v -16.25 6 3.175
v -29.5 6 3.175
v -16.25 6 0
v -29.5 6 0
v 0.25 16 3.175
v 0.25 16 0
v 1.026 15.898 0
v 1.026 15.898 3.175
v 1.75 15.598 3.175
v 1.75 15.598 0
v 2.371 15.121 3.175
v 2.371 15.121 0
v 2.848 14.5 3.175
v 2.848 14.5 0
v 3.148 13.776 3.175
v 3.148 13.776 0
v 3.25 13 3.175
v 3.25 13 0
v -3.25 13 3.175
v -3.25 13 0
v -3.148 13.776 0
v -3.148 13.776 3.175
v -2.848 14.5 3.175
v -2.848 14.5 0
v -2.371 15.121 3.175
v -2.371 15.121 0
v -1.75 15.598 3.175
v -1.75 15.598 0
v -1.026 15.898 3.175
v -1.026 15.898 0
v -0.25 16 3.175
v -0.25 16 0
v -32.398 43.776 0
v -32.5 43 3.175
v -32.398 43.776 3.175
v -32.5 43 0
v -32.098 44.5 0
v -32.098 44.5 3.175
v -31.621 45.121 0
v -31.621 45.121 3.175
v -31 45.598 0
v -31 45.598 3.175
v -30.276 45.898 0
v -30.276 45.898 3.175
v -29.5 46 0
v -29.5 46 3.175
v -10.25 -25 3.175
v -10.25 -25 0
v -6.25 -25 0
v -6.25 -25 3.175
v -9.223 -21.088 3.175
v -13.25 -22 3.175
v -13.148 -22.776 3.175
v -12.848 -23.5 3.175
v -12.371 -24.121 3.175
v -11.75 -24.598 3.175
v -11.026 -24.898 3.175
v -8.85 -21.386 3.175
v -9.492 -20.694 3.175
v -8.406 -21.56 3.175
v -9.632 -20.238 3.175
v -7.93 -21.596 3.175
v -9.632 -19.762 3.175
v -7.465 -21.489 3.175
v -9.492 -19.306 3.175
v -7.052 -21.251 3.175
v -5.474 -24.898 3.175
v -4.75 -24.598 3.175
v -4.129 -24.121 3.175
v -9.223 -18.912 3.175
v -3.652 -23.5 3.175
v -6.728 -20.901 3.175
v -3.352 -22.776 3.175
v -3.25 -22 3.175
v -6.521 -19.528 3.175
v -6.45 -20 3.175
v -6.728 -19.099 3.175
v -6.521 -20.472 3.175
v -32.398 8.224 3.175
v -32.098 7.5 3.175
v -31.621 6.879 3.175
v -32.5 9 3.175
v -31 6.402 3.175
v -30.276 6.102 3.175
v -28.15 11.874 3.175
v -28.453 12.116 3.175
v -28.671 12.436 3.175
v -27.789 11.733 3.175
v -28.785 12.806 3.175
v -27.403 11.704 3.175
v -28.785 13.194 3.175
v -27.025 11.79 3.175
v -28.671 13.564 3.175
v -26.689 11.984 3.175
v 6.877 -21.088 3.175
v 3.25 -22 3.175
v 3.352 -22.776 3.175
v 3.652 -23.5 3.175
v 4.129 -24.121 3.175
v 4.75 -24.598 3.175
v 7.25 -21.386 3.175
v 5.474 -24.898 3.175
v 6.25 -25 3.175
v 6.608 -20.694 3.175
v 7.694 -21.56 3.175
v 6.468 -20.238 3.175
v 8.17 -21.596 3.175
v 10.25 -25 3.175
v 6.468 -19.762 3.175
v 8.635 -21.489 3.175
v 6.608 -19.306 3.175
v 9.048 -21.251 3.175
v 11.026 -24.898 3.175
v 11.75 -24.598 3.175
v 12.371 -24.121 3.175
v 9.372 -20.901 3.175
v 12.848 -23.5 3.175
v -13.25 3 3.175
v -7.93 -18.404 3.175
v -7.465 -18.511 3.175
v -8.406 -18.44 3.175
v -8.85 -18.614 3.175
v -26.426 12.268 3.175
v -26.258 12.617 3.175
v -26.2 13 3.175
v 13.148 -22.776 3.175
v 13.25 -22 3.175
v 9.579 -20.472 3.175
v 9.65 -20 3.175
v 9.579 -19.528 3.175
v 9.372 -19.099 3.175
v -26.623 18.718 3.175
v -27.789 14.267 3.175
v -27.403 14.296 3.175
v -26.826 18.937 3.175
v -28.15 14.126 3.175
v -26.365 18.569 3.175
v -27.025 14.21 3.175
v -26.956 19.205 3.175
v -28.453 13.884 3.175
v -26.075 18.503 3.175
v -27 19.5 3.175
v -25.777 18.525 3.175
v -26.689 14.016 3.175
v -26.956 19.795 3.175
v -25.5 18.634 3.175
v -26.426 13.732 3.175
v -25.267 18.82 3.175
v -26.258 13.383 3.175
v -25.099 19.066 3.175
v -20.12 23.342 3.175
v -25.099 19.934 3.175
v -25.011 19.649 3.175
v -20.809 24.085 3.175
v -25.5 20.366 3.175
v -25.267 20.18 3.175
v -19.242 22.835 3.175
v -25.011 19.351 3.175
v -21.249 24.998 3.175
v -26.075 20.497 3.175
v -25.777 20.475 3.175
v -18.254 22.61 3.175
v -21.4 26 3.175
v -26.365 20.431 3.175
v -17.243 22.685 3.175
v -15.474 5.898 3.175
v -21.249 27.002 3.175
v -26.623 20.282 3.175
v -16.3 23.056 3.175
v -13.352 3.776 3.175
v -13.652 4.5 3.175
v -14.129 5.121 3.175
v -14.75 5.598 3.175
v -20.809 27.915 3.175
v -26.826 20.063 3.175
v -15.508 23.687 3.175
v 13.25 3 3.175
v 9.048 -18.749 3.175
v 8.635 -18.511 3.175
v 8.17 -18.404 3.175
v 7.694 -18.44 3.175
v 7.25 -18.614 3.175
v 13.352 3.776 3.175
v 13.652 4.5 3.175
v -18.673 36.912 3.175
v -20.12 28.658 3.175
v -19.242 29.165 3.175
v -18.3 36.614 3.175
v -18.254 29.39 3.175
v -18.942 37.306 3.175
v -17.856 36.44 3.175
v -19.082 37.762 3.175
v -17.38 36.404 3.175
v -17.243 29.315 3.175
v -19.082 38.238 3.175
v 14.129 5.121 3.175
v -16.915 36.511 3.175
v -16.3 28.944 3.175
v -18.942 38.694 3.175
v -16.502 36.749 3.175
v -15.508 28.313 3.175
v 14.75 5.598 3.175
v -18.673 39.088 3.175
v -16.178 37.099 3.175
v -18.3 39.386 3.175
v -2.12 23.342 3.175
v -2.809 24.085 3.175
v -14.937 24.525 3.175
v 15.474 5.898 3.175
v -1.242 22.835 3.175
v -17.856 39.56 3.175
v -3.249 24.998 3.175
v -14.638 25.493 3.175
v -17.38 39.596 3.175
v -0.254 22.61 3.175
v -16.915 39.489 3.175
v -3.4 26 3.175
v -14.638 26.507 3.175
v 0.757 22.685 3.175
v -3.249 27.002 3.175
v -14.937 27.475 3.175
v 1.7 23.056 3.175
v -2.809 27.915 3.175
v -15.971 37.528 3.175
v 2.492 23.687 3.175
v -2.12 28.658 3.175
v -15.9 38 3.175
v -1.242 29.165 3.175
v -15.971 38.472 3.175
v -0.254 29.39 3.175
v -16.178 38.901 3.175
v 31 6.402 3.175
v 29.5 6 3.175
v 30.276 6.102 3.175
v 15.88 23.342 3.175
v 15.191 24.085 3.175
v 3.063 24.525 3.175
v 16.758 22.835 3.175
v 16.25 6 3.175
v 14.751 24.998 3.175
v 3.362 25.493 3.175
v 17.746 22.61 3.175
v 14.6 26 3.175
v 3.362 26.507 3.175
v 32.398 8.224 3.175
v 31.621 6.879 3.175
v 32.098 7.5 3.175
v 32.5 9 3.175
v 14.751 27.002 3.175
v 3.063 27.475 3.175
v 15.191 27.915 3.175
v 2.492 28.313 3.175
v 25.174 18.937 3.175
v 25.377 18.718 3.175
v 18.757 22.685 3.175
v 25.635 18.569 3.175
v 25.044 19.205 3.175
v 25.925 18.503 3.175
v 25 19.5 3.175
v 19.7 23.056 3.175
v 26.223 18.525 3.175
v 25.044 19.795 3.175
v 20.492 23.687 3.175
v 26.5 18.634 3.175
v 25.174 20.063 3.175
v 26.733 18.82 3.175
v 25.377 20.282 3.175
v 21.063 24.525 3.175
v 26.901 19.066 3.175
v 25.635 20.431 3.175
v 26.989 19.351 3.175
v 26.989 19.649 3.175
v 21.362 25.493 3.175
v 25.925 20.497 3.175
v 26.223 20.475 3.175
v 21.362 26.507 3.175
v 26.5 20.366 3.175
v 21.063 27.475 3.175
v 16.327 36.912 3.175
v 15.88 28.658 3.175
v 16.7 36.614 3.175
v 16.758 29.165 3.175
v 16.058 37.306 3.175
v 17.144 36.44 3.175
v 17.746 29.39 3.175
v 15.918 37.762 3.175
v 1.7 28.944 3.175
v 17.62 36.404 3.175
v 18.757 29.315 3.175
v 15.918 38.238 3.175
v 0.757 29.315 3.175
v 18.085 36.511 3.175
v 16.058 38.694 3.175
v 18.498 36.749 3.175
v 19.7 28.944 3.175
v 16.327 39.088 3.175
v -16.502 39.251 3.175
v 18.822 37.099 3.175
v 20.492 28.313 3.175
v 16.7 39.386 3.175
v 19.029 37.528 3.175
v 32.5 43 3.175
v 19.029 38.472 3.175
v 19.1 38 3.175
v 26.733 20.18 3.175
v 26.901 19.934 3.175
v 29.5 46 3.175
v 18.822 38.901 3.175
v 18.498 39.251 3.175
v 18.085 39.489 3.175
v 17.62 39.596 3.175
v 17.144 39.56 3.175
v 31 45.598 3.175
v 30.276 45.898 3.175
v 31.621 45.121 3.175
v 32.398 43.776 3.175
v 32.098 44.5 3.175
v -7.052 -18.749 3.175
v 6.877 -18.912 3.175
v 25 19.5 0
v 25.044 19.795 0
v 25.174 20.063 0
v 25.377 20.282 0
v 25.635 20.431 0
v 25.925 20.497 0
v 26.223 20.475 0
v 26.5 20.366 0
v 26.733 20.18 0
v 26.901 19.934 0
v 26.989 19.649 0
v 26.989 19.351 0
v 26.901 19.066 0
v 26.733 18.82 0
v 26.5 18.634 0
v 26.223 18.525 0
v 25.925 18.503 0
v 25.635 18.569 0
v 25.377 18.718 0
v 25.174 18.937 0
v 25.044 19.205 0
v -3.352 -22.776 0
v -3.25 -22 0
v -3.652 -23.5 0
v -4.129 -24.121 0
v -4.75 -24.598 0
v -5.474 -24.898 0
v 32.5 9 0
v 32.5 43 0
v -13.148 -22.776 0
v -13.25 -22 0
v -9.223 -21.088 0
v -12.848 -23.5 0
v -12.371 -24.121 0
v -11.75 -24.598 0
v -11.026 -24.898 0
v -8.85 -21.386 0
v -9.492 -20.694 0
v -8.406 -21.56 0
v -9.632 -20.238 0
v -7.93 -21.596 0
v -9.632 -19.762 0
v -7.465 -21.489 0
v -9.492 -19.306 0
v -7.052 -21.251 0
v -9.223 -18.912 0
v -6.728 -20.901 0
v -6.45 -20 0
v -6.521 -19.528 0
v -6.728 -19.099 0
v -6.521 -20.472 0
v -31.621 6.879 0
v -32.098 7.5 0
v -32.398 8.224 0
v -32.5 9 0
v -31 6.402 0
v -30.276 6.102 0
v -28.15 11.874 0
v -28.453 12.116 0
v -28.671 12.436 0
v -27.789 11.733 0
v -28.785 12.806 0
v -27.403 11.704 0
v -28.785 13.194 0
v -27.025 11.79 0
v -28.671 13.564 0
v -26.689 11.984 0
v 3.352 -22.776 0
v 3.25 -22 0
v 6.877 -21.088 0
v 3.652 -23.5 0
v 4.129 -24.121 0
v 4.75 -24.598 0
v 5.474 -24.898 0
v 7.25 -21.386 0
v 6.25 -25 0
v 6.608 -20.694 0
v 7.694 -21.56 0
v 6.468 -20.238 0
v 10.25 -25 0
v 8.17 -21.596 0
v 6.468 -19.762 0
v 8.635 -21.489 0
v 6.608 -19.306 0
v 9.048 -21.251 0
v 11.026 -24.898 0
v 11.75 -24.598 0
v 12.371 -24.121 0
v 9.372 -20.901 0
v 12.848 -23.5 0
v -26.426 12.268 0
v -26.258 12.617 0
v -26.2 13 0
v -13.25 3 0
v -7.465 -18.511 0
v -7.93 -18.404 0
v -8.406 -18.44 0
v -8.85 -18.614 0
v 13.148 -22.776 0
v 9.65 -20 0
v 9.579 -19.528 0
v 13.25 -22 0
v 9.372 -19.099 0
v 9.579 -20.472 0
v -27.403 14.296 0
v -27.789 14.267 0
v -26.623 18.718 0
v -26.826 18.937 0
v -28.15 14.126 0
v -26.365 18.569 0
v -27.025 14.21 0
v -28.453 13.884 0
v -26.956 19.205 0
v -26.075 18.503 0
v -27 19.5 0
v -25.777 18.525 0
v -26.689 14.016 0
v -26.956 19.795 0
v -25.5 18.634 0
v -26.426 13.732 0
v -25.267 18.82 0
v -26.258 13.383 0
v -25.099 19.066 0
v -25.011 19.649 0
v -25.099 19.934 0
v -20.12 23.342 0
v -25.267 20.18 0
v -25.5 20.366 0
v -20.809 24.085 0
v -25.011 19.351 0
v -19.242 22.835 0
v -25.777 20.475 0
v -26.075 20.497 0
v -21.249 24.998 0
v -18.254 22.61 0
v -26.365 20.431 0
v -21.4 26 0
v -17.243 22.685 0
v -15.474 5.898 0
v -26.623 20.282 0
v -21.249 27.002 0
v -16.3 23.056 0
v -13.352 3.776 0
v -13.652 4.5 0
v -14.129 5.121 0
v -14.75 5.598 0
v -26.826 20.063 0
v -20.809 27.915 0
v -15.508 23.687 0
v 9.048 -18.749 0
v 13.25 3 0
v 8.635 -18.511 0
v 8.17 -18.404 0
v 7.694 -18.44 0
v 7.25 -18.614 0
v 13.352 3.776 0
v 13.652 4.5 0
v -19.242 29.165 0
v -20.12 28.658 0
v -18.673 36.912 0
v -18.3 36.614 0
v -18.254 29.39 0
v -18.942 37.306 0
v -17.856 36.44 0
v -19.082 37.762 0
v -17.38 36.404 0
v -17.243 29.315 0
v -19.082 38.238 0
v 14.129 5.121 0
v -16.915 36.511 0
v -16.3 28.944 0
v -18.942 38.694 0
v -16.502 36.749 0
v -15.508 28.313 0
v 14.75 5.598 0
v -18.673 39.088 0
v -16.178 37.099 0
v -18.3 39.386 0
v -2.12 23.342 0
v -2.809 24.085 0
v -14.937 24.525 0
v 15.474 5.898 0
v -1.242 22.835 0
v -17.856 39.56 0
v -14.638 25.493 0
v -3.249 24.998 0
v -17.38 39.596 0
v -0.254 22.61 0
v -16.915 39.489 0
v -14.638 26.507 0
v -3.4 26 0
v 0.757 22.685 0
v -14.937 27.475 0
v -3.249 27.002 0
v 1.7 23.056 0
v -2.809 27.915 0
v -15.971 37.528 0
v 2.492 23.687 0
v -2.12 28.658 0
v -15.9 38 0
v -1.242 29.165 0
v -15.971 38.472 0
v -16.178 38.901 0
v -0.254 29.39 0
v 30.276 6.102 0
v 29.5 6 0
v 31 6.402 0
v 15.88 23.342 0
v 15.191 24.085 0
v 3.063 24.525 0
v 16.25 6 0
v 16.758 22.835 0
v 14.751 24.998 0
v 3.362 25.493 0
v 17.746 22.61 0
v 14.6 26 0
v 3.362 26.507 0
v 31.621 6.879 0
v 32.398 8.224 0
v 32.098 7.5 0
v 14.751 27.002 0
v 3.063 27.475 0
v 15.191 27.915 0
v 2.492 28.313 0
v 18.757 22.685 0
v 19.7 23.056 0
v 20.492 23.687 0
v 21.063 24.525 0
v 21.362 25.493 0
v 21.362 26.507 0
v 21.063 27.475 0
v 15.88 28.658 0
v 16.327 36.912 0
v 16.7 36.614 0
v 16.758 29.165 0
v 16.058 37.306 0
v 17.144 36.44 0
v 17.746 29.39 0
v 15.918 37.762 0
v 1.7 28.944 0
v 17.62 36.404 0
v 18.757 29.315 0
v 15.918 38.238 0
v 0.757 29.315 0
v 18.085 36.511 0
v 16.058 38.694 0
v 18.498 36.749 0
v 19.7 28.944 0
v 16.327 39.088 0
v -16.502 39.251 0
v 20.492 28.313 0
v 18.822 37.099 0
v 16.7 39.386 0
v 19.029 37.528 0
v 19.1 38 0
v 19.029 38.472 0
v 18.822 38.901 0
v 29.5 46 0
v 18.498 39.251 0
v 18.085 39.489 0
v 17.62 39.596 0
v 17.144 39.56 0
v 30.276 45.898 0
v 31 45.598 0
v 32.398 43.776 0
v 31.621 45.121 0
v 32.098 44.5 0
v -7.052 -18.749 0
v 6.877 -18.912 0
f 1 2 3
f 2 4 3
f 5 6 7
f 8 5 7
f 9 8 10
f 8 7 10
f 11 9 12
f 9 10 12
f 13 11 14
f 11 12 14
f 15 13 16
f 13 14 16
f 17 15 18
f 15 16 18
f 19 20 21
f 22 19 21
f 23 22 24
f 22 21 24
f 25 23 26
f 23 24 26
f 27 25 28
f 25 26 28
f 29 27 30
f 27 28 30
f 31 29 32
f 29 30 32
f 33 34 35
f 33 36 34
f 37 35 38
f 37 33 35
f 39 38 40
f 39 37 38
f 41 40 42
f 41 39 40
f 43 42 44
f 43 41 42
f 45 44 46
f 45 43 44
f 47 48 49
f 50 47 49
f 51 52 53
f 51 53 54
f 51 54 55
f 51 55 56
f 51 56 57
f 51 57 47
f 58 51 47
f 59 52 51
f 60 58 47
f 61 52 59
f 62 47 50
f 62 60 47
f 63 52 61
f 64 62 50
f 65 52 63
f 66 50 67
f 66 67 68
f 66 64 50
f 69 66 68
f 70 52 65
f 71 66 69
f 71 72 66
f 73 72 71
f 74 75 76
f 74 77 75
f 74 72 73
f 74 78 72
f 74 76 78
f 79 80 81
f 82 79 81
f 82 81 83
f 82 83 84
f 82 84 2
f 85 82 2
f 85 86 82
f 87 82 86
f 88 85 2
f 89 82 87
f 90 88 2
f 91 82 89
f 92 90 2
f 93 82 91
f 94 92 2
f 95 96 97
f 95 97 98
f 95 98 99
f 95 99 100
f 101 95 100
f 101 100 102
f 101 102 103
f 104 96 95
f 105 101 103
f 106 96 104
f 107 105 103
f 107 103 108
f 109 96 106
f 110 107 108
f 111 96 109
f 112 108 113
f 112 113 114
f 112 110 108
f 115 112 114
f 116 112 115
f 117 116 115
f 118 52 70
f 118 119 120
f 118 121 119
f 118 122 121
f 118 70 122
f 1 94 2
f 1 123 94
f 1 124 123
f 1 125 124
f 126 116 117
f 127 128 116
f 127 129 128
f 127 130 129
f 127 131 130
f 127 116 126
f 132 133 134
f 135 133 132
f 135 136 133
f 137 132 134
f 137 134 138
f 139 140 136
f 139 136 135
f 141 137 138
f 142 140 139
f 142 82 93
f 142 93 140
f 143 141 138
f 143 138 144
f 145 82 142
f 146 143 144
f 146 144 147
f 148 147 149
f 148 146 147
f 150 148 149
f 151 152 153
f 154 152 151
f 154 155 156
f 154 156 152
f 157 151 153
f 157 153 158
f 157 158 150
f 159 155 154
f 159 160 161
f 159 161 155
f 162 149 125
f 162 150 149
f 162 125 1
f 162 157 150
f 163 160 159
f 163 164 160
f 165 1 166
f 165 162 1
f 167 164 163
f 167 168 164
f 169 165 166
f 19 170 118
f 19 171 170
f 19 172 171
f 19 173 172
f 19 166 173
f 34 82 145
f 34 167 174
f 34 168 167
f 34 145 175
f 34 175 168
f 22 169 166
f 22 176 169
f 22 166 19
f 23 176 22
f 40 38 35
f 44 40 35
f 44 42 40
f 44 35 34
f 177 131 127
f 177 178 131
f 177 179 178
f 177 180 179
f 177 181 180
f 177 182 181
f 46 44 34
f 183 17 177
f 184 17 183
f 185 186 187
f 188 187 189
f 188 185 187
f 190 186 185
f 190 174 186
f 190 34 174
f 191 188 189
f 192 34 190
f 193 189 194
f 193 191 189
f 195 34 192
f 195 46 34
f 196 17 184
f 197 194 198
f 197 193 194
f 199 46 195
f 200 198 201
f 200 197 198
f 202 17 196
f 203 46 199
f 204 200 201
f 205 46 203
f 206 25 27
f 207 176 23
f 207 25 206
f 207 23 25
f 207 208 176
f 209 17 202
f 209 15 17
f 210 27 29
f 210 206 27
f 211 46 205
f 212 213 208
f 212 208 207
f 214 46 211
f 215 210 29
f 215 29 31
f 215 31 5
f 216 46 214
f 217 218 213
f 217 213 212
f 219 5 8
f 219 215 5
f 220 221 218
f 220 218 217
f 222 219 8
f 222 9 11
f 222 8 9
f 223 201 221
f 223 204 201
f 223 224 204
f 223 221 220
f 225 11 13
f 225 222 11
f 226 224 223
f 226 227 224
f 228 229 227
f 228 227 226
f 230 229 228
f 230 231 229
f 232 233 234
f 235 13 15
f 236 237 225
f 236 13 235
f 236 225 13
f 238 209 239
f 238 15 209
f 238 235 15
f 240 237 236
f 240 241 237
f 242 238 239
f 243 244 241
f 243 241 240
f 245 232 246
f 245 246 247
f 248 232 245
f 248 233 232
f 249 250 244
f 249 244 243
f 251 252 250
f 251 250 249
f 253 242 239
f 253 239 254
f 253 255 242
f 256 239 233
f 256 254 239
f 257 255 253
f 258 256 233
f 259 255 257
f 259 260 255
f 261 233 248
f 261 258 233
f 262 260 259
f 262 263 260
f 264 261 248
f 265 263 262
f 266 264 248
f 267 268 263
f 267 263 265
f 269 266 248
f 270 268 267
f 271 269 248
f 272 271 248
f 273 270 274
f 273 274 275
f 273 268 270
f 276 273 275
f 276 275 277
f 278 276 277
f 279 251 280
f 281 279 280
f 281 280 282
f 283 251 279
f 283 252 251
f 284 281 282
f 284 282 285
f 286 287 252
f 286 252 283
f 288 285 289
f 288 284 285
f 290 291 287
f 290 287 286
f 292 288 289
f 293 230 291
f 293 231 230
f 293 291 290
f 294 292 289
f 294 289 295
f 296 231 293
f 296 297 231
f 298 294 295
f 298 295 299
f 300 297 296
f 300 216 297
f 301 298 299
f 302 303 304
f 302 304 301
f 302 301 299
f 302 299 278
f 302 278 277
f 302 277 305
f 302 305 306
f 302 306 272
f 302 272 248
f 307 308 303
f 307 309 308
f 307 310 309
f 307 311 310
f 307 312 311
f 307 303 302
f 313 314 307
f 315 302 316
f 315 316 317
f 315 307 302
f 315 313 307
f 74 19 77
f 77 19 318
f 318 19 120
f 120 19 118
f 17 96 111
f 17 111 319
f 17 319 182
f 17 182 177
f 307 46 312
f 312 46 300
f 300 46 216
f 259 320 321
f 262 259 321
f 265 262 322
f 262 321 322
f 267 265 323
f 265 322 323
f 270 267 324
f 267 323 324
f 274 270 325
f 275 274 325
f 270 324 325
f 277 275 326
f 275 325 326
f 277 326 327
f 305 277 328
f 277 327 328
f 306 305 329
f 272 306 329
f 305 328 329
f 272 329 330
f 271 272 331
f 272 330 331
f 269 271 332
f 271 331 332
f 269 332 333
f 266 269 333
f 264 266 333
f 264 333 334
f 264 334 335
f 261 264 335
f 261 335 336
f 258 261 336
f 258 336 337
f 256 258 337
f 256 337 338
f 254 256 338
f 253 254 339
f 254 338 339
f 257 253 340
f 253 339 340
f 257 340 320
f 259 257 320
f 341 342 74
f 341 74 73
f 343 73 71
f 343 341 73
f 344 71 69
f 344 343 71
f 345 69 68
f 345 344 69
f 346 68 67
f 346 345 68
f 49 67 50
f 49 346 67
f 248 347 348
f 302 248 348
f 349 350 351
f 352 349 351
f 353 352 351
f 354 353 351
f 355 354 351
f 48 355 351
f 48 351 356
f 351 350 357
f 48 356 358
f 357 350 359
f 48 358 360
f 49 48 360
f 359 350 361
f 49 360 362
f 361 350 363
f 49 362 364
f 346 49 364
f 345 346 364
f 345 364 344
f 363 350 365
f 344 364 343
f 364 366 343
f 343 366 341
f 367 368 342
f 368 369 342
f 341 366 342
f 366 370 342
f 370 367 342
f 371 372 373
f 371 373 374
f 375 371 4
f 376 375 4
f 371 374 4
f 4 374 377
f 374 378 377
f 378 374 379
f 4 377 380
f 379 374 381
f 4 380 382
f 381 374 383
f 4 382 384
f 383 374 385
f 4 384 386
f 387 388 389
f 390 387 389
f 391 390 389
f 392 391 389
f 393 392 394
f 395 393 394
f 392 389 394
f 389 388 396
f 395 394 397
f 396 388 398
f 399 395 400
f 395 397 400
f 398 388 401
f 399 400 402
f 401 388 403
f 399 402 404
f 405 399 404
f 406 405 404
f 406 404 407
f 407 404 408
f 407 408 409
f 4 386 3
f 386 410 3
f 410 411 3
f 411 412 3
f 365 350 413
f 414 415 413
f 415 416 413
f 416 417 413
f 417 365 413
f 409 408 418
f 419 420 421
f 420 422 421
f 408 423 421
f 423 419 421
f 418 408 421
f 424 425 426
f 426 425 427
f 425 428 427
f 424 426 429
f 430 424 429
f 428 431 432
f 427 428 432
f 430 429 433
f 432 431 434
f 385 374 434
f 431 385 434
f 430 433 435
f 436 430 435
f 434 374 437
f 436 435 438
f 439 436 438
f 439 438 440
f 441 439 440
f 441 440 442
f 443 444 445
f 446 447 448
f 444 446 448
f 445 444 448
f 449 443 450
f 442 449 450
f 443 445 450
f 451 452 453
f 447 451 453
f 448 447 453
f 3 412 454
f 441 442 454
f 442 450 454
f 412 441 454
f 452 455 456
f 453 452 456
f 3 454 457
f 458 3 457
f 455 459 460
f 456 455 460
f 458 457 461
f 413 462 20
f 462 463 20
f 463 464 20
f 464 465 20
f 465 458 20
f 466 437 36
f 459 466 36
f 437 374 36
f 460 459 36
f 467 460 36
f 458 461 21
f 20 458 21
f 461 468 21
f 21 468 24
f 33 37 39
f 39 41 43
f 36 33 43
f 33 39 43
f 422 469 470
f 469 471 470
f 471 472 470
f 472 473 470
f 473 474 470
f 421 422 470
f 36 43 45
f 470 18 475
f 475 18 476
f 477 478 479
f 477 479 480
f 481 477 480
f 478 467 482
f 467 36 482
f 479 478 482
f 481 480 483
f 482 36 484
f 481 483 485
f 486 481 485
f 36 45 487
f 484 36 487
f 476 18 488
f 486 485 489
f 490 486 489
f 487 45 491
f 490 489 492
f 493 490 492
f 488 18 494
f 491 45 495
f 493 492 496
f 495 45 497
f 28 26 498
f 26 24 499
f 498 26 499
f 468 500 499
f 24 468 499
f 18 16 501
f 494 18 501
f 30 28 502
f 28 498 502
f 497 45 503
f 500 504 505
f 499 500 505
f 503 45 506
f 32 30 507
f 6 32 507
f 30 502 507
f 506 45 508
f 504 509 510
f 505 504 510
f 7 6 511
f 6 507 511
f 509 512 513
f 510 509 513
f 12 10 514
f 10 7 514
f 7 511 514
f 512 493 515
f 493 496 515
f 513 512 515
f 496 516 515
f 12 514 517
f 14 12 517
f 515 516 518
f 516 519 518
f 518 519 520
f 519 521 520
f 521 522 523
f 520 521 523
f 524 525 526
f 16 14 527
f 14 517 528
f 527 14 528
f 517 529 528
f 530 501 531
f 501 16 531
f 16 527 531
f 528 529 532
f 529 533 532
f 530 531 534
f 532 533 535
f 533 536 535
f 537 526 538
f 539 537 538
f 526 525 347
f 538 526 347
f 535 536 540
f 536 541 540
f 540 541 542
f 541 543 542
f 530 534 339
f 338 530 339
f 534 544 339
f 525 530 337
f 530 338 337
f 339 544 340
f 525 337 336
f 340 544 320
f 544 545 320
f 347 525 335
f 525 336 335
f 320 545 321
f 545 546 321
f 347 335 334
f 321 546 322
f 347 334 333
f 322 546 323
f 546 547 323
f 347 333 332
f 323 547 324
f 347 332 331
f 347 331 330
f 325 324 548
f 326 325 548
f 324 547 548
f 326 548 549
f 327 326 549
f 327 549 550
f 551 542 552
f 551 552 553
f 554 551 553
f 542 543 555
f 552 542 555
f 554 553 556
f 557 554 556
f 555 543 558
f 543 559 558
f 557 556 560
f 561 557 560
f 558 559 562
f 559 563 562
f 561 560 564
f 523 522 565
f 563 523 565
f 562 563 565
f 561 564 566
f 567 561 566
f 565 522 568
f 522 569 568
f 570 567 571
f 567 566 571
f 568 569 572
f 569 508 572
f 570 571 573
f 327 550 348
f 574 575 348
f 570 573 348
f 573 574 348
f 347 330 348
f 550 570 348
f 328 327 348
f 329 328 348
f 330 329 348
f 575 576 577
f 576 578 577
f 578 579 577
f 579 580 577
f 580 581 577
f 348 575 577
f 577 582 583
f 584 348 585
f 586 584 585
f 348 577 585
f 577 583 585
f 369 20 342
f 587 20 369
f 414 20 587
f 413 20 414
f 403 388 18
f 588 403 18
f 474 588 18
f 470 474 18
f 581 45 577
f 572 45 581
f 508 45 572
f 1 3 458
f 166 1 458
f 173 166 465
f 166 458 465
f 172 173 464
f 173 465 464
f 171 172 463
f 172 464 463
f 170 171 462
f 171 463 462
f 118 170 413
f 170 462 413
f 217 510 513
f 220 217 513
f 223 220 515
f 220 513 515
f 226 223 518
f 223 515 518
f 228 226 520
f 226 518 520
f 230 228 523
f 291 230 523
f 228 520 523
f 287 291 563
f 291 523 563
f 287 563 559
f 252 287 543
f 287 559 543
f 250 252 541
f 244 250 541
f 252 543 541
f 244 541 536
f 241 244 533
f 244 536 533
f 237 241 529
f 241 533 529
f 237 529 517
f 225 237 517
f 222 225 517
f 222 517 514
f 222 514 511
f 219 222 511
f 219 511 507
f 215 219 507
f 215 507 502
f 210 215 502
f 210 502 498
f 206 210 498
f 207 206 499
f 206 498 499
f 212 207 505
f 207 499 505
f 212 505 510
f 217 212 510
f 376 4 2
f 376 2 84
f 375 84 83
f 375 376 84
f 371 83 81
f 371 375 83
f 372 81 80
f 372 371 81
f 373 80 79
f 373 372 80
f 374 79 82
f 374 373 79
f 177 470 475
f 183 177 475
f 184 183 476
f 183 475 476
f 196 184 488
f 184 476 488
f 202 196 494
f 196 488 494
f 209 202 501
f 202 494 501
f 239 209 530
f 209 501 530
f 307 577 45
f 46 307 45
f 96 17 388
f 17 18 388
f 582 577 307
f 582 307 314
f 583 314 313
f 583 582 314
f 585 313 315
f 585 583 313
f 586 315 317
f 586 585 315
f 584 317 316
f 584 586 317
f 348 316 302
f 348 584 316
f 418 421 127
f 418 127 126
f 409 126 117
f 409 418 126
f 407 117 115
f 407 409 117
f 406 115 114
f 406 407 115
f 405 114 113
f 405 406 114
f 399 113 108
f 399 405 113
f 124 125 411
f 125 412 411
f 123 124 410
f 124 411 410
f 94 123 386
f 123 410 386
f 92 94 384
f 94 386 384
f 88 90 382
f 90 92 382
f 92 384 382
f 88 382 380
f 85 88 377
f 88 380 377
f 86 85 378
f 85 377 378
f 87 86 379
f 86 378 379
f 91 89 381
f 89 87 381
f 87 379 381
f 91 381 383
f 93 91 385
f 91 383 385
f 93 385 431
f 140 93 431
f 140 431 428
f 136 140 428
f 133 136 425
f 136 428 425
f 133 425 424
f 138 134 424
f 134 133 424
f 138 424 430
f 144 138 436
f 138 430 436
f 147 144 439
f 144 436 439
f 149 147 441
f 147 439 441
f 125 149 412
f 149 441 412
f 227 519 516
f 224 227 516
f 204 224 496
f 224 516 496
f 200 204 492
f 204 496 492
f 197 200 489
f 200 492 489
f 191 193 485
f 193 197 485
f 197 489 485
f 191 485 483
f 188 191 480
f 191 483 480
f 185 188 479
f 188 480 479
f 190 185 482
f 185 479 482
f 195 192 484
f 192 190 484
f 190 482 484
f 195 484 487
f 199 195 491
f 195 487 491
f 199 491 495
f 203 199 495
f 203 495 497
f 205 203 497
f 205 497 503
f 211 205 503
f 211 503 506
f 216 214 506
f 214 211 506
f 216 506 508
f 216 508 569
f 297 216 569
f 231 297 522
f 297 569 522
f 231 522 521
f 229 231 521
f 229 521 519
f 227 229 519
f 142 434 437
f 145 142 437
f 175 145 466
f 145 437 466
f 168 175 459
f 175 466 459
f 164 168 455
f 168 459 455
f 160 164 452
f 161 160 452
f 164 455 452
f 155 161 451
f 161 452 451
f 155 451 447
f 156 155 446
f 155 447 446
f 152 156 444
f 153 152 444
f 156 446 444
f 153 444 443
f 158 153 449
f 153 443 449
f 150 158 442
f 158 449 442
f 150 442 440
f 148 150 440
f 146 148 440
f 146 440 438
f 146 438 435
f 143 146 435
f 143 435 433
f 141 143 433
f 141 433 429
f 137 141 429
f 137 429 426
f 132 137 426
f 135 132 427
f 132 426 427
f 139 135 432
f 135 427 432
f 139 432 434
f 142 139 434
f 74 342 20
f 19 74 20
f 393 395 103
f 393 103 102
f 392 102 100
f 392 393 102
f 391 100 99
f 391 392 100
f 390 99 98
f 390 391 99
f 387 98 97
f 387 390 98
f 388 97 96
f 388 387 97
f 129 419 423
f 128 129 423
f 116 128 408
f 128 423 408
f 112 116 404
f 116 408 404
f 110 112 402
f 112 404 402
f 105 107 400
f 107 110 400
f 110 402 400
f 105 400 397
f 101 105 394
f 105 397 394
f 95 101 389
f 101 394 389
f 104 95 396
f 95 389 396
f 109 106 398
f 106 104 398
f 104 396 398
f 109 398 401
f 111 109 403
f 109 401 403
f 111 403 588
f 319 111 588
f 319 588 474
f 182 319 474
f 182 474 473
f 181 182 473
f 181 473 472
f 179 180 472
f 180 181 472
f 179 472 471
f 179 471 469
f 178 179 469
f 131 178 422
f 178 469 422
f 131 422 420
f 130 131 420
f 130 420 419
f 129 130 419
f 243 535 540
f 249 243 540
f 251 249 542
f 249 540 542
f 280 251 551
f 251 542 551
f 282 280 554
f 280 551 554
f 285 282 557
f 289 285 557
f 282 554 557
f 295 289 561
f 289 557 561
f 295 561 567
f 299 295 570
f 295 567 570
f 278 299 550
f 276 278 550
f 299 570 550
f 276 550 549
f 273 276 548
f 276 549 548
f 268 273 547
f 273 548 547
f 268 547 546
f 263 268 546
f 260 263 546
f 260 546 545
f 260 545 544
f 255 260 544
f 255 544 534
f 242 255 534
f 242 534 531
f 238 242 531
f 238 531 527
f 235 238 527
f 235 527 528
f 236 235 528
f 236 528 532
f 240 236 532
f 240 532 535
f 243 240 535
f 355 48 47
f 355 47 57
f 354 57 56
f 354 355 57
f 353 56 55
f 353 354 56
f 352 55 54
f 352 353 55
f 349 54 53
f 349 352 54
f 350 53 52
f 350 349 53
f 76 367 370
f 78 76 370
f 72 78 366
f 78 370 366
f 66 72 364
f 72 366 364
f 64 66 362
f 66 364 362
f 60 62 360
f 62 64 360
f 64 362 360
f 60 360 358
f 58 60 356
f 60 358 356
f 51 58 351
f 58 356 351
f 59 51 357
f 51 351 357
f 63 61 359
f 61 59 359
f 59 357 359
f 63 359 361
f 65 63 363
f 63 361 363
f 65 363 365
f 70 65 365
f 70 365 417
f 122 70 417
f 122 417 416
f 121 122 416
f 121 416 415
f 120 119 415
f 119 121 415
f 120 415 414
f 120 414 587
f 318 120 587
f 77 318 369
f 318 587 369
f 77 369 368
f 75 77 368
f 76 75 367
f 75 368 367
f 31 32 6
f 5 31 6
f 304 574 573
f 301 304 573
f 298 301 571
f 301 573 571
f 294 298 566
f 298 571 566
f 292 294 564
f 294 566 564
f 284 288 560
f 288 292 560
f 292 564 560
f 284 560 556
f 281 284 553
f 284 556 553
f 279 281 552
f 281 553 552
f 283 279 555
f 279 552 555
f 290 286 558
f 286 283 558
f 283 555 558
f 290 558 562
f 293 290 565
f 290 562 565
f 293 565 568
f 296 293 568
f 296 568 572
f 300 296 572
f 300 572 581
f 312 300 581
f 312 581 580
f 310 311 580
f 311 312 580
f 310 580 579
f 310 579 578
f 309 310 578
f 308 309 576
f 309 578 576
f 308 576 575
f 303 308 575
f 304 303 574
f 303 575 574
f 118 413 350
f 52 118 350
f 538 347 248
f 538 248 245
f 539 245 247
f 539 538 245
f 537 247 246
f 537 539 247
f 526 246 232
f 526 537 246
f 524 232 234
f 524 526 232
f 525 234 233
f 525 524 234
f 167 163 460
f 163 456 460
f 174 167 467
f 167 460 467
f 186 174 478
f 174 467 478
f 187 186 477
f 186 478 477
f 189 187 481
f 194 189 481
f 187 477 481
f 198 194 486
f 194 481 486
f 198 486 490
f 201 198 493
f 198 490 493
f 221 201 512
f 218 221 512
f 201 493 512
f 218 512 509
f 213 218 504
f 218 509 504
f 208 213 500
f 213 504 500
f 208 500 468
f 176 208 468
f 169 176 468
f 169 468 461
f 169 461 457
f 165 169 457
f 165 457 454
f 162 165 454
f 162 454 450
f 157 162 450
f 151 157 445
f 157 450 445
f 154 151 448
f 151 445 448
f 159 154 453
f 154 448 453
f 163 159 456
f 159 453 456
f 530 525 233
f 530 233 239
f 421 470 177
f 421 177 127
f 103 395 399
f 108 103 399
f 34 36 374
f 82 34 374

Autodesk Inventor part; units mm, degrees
ref_plane "YZ Plane" through (0, 0, 0) normal (1, 0, 0) x (0, 1, 0)
ref_plane "XZ Plane" through (0, 0, 0) normal (0, 1, 0) x (-1, 0, 0)
ref_plane "XY Plane" through (0, 0, 0) normal (0, 0, 1) x (1, 0, 0)
sketch "Sketch2" plane through (0, 0, 0) normal (0, 0, 1) x (1, 0, 0)
  line L0 (-10.25, -25) -> (-6.25, -25)
  line L1 (-3.25, -22) -> (-3.25, 13)
  line L2 (-0.25, 16) -> (0.25, 16)
  line L3 (3.25, 13) -> (3.25, -22)
  line L4 (6.25, -25) -> (10.25, -25)
  line L5 (29.5, 46) -> (-29.5, 46)
  line L6 (-32.5, 43) -> (-32.5, 9)
  line L7 (0, 0) -> (0, 46) construction
  circle A0 centre (-17.5, 38) radius 1.6
  circle A1 centre (17.5, 38) radius 1.6
  circle A2 centre (-8.05, -20) radius 1.6
  circle A3 centre (8.05, -20) radius 1.6
  line L8 (0, 0) -> (32.5, 0) construction
  arc A4 (-0.25, 16) -> (-3.25, 13) centre (-0.25, 13) ccw
  arc A5 (3.25, 13) -> (0.25, 16) centre (0.25, 13) ccw
  arc A6 (-29.5, 46) -> (-32.5, 43) centre (-29.5, 43) ccw
  arc A7 (32.5, 43) -> (29.5, 46) centre (29.5, 43) ccw
  arc A8 (3.25, -22) -> (6.25, -25) centre (6.25, -22) ccw
  arc A9 (-6.25, -25) -> (-3.25, -22) centre (-6.25, -22) ccw
  circle A10 centre (-27.5, 13) radius 1.3
  line L9 (29.5, 6) -> (16.25, 6)
  line L10 (13.25, 3) -> (13.25, -22)
  line L11 (-29.5, 6) -> (-16.25, 6)
  line L12 (-13.25, 3) -> (-13.25, -22)
  line L13 (32.5, 9) -> (32.5, 43)
  arc A11 (10.25, -25) -> (13.25, -22) centre (10.25, -22) ccw
  arc A12 (-13.25, -22) -> (-10.25, -25) centre (-10.25, -22) ccw
  arc A13 (16.25, 6) -> (13.25, 3) centre (16.25, 3) ccw
  arc A14 (-13.25, 3) -> (-16.25, 6) centre (-16.25, 3) ccw
  arc A15 (29.5, 6) -> (32.5, 9) centre (29.5, 9) ccw
  arc A16 (-32.5, 9) -> (-29.5, 6) centre (-29.5, 9) ccw
  point P0 (-3.25, 16)
  point P1 (3.25, 16)
  point P2 (3.25, -25)
  point P3 (32.5, 6)
  point P4 (13.25, 6)
  point P5 (-13.25, 6)
  point P6 (13.25, -25)
  point P7 (-13.25, -25)
  point P8 (-32.5, 6)
  dimension "d1" = 16.1
  dimension "d3" = 16
  dimension "d4" = 20
  dimension "d5" = 5
  dimension "d6" = 6.5
  dimension "d7" = 3.2
  dimension "d13" = 8
  dimension "d14" = 15
  dimension "d16" = 30
  dimension "d18" = 3.2
  dimension "d19" = 3
  dimension "d20" = 3
  dimension "d23" = 5
  dimension "d24" = 33
  dimension "d25" = 2.6
  dimension "d26" = 32.5
  dimension "d27" = 10
  dimension "d28" = 3
  dimension "d29" = 40
extrude "Extrusion1" add sketch "Sketch2" along normal blind 3.175
sketch "Sketch3" plane through (0, 0, 0) normal (0, 0, -1) x (-1, 0, 0)
  circle A0 centre (0, 26) radius 3.4
  circle A1 centre (18, 26) radius 3.4
  circle A2 centre (-18, 26) radius 3.4
  line L0 (-29.5, 46) -> (29.5, 46) projected
  line L1 (-32.5, 9) -> (-32.5, 43) construction
  line L2 (-32.5, 26) -> (32.5, 26) construction
  line L3 (32.5, 43) -> (32.5, 9) construction
  line L4 (-18, 26) -> (18, 26) construction
  line L5 (-29.5, 46) -> (29.5, 46) construction
  line L6 (0, 46) -> (0, 26) construction
  circle A3 centre (-26, 19.5) radius 1
  circle A4 centre (26, 19.5) radius 1
  line L7 (0, 26) -> (0, 46) construction
  point P0 (0, 0)
  dimension "d30" = 6.8
  dimension "d34" = 18
  dimension "d35" = 18
  dimension "d38" = 52
  dimension "d39" = 6.5
  dimension "d40" = 2
extrude "Extrusion2" cut sketch "Sketch3" against normal up to next
properties part number "shovel_mount"
